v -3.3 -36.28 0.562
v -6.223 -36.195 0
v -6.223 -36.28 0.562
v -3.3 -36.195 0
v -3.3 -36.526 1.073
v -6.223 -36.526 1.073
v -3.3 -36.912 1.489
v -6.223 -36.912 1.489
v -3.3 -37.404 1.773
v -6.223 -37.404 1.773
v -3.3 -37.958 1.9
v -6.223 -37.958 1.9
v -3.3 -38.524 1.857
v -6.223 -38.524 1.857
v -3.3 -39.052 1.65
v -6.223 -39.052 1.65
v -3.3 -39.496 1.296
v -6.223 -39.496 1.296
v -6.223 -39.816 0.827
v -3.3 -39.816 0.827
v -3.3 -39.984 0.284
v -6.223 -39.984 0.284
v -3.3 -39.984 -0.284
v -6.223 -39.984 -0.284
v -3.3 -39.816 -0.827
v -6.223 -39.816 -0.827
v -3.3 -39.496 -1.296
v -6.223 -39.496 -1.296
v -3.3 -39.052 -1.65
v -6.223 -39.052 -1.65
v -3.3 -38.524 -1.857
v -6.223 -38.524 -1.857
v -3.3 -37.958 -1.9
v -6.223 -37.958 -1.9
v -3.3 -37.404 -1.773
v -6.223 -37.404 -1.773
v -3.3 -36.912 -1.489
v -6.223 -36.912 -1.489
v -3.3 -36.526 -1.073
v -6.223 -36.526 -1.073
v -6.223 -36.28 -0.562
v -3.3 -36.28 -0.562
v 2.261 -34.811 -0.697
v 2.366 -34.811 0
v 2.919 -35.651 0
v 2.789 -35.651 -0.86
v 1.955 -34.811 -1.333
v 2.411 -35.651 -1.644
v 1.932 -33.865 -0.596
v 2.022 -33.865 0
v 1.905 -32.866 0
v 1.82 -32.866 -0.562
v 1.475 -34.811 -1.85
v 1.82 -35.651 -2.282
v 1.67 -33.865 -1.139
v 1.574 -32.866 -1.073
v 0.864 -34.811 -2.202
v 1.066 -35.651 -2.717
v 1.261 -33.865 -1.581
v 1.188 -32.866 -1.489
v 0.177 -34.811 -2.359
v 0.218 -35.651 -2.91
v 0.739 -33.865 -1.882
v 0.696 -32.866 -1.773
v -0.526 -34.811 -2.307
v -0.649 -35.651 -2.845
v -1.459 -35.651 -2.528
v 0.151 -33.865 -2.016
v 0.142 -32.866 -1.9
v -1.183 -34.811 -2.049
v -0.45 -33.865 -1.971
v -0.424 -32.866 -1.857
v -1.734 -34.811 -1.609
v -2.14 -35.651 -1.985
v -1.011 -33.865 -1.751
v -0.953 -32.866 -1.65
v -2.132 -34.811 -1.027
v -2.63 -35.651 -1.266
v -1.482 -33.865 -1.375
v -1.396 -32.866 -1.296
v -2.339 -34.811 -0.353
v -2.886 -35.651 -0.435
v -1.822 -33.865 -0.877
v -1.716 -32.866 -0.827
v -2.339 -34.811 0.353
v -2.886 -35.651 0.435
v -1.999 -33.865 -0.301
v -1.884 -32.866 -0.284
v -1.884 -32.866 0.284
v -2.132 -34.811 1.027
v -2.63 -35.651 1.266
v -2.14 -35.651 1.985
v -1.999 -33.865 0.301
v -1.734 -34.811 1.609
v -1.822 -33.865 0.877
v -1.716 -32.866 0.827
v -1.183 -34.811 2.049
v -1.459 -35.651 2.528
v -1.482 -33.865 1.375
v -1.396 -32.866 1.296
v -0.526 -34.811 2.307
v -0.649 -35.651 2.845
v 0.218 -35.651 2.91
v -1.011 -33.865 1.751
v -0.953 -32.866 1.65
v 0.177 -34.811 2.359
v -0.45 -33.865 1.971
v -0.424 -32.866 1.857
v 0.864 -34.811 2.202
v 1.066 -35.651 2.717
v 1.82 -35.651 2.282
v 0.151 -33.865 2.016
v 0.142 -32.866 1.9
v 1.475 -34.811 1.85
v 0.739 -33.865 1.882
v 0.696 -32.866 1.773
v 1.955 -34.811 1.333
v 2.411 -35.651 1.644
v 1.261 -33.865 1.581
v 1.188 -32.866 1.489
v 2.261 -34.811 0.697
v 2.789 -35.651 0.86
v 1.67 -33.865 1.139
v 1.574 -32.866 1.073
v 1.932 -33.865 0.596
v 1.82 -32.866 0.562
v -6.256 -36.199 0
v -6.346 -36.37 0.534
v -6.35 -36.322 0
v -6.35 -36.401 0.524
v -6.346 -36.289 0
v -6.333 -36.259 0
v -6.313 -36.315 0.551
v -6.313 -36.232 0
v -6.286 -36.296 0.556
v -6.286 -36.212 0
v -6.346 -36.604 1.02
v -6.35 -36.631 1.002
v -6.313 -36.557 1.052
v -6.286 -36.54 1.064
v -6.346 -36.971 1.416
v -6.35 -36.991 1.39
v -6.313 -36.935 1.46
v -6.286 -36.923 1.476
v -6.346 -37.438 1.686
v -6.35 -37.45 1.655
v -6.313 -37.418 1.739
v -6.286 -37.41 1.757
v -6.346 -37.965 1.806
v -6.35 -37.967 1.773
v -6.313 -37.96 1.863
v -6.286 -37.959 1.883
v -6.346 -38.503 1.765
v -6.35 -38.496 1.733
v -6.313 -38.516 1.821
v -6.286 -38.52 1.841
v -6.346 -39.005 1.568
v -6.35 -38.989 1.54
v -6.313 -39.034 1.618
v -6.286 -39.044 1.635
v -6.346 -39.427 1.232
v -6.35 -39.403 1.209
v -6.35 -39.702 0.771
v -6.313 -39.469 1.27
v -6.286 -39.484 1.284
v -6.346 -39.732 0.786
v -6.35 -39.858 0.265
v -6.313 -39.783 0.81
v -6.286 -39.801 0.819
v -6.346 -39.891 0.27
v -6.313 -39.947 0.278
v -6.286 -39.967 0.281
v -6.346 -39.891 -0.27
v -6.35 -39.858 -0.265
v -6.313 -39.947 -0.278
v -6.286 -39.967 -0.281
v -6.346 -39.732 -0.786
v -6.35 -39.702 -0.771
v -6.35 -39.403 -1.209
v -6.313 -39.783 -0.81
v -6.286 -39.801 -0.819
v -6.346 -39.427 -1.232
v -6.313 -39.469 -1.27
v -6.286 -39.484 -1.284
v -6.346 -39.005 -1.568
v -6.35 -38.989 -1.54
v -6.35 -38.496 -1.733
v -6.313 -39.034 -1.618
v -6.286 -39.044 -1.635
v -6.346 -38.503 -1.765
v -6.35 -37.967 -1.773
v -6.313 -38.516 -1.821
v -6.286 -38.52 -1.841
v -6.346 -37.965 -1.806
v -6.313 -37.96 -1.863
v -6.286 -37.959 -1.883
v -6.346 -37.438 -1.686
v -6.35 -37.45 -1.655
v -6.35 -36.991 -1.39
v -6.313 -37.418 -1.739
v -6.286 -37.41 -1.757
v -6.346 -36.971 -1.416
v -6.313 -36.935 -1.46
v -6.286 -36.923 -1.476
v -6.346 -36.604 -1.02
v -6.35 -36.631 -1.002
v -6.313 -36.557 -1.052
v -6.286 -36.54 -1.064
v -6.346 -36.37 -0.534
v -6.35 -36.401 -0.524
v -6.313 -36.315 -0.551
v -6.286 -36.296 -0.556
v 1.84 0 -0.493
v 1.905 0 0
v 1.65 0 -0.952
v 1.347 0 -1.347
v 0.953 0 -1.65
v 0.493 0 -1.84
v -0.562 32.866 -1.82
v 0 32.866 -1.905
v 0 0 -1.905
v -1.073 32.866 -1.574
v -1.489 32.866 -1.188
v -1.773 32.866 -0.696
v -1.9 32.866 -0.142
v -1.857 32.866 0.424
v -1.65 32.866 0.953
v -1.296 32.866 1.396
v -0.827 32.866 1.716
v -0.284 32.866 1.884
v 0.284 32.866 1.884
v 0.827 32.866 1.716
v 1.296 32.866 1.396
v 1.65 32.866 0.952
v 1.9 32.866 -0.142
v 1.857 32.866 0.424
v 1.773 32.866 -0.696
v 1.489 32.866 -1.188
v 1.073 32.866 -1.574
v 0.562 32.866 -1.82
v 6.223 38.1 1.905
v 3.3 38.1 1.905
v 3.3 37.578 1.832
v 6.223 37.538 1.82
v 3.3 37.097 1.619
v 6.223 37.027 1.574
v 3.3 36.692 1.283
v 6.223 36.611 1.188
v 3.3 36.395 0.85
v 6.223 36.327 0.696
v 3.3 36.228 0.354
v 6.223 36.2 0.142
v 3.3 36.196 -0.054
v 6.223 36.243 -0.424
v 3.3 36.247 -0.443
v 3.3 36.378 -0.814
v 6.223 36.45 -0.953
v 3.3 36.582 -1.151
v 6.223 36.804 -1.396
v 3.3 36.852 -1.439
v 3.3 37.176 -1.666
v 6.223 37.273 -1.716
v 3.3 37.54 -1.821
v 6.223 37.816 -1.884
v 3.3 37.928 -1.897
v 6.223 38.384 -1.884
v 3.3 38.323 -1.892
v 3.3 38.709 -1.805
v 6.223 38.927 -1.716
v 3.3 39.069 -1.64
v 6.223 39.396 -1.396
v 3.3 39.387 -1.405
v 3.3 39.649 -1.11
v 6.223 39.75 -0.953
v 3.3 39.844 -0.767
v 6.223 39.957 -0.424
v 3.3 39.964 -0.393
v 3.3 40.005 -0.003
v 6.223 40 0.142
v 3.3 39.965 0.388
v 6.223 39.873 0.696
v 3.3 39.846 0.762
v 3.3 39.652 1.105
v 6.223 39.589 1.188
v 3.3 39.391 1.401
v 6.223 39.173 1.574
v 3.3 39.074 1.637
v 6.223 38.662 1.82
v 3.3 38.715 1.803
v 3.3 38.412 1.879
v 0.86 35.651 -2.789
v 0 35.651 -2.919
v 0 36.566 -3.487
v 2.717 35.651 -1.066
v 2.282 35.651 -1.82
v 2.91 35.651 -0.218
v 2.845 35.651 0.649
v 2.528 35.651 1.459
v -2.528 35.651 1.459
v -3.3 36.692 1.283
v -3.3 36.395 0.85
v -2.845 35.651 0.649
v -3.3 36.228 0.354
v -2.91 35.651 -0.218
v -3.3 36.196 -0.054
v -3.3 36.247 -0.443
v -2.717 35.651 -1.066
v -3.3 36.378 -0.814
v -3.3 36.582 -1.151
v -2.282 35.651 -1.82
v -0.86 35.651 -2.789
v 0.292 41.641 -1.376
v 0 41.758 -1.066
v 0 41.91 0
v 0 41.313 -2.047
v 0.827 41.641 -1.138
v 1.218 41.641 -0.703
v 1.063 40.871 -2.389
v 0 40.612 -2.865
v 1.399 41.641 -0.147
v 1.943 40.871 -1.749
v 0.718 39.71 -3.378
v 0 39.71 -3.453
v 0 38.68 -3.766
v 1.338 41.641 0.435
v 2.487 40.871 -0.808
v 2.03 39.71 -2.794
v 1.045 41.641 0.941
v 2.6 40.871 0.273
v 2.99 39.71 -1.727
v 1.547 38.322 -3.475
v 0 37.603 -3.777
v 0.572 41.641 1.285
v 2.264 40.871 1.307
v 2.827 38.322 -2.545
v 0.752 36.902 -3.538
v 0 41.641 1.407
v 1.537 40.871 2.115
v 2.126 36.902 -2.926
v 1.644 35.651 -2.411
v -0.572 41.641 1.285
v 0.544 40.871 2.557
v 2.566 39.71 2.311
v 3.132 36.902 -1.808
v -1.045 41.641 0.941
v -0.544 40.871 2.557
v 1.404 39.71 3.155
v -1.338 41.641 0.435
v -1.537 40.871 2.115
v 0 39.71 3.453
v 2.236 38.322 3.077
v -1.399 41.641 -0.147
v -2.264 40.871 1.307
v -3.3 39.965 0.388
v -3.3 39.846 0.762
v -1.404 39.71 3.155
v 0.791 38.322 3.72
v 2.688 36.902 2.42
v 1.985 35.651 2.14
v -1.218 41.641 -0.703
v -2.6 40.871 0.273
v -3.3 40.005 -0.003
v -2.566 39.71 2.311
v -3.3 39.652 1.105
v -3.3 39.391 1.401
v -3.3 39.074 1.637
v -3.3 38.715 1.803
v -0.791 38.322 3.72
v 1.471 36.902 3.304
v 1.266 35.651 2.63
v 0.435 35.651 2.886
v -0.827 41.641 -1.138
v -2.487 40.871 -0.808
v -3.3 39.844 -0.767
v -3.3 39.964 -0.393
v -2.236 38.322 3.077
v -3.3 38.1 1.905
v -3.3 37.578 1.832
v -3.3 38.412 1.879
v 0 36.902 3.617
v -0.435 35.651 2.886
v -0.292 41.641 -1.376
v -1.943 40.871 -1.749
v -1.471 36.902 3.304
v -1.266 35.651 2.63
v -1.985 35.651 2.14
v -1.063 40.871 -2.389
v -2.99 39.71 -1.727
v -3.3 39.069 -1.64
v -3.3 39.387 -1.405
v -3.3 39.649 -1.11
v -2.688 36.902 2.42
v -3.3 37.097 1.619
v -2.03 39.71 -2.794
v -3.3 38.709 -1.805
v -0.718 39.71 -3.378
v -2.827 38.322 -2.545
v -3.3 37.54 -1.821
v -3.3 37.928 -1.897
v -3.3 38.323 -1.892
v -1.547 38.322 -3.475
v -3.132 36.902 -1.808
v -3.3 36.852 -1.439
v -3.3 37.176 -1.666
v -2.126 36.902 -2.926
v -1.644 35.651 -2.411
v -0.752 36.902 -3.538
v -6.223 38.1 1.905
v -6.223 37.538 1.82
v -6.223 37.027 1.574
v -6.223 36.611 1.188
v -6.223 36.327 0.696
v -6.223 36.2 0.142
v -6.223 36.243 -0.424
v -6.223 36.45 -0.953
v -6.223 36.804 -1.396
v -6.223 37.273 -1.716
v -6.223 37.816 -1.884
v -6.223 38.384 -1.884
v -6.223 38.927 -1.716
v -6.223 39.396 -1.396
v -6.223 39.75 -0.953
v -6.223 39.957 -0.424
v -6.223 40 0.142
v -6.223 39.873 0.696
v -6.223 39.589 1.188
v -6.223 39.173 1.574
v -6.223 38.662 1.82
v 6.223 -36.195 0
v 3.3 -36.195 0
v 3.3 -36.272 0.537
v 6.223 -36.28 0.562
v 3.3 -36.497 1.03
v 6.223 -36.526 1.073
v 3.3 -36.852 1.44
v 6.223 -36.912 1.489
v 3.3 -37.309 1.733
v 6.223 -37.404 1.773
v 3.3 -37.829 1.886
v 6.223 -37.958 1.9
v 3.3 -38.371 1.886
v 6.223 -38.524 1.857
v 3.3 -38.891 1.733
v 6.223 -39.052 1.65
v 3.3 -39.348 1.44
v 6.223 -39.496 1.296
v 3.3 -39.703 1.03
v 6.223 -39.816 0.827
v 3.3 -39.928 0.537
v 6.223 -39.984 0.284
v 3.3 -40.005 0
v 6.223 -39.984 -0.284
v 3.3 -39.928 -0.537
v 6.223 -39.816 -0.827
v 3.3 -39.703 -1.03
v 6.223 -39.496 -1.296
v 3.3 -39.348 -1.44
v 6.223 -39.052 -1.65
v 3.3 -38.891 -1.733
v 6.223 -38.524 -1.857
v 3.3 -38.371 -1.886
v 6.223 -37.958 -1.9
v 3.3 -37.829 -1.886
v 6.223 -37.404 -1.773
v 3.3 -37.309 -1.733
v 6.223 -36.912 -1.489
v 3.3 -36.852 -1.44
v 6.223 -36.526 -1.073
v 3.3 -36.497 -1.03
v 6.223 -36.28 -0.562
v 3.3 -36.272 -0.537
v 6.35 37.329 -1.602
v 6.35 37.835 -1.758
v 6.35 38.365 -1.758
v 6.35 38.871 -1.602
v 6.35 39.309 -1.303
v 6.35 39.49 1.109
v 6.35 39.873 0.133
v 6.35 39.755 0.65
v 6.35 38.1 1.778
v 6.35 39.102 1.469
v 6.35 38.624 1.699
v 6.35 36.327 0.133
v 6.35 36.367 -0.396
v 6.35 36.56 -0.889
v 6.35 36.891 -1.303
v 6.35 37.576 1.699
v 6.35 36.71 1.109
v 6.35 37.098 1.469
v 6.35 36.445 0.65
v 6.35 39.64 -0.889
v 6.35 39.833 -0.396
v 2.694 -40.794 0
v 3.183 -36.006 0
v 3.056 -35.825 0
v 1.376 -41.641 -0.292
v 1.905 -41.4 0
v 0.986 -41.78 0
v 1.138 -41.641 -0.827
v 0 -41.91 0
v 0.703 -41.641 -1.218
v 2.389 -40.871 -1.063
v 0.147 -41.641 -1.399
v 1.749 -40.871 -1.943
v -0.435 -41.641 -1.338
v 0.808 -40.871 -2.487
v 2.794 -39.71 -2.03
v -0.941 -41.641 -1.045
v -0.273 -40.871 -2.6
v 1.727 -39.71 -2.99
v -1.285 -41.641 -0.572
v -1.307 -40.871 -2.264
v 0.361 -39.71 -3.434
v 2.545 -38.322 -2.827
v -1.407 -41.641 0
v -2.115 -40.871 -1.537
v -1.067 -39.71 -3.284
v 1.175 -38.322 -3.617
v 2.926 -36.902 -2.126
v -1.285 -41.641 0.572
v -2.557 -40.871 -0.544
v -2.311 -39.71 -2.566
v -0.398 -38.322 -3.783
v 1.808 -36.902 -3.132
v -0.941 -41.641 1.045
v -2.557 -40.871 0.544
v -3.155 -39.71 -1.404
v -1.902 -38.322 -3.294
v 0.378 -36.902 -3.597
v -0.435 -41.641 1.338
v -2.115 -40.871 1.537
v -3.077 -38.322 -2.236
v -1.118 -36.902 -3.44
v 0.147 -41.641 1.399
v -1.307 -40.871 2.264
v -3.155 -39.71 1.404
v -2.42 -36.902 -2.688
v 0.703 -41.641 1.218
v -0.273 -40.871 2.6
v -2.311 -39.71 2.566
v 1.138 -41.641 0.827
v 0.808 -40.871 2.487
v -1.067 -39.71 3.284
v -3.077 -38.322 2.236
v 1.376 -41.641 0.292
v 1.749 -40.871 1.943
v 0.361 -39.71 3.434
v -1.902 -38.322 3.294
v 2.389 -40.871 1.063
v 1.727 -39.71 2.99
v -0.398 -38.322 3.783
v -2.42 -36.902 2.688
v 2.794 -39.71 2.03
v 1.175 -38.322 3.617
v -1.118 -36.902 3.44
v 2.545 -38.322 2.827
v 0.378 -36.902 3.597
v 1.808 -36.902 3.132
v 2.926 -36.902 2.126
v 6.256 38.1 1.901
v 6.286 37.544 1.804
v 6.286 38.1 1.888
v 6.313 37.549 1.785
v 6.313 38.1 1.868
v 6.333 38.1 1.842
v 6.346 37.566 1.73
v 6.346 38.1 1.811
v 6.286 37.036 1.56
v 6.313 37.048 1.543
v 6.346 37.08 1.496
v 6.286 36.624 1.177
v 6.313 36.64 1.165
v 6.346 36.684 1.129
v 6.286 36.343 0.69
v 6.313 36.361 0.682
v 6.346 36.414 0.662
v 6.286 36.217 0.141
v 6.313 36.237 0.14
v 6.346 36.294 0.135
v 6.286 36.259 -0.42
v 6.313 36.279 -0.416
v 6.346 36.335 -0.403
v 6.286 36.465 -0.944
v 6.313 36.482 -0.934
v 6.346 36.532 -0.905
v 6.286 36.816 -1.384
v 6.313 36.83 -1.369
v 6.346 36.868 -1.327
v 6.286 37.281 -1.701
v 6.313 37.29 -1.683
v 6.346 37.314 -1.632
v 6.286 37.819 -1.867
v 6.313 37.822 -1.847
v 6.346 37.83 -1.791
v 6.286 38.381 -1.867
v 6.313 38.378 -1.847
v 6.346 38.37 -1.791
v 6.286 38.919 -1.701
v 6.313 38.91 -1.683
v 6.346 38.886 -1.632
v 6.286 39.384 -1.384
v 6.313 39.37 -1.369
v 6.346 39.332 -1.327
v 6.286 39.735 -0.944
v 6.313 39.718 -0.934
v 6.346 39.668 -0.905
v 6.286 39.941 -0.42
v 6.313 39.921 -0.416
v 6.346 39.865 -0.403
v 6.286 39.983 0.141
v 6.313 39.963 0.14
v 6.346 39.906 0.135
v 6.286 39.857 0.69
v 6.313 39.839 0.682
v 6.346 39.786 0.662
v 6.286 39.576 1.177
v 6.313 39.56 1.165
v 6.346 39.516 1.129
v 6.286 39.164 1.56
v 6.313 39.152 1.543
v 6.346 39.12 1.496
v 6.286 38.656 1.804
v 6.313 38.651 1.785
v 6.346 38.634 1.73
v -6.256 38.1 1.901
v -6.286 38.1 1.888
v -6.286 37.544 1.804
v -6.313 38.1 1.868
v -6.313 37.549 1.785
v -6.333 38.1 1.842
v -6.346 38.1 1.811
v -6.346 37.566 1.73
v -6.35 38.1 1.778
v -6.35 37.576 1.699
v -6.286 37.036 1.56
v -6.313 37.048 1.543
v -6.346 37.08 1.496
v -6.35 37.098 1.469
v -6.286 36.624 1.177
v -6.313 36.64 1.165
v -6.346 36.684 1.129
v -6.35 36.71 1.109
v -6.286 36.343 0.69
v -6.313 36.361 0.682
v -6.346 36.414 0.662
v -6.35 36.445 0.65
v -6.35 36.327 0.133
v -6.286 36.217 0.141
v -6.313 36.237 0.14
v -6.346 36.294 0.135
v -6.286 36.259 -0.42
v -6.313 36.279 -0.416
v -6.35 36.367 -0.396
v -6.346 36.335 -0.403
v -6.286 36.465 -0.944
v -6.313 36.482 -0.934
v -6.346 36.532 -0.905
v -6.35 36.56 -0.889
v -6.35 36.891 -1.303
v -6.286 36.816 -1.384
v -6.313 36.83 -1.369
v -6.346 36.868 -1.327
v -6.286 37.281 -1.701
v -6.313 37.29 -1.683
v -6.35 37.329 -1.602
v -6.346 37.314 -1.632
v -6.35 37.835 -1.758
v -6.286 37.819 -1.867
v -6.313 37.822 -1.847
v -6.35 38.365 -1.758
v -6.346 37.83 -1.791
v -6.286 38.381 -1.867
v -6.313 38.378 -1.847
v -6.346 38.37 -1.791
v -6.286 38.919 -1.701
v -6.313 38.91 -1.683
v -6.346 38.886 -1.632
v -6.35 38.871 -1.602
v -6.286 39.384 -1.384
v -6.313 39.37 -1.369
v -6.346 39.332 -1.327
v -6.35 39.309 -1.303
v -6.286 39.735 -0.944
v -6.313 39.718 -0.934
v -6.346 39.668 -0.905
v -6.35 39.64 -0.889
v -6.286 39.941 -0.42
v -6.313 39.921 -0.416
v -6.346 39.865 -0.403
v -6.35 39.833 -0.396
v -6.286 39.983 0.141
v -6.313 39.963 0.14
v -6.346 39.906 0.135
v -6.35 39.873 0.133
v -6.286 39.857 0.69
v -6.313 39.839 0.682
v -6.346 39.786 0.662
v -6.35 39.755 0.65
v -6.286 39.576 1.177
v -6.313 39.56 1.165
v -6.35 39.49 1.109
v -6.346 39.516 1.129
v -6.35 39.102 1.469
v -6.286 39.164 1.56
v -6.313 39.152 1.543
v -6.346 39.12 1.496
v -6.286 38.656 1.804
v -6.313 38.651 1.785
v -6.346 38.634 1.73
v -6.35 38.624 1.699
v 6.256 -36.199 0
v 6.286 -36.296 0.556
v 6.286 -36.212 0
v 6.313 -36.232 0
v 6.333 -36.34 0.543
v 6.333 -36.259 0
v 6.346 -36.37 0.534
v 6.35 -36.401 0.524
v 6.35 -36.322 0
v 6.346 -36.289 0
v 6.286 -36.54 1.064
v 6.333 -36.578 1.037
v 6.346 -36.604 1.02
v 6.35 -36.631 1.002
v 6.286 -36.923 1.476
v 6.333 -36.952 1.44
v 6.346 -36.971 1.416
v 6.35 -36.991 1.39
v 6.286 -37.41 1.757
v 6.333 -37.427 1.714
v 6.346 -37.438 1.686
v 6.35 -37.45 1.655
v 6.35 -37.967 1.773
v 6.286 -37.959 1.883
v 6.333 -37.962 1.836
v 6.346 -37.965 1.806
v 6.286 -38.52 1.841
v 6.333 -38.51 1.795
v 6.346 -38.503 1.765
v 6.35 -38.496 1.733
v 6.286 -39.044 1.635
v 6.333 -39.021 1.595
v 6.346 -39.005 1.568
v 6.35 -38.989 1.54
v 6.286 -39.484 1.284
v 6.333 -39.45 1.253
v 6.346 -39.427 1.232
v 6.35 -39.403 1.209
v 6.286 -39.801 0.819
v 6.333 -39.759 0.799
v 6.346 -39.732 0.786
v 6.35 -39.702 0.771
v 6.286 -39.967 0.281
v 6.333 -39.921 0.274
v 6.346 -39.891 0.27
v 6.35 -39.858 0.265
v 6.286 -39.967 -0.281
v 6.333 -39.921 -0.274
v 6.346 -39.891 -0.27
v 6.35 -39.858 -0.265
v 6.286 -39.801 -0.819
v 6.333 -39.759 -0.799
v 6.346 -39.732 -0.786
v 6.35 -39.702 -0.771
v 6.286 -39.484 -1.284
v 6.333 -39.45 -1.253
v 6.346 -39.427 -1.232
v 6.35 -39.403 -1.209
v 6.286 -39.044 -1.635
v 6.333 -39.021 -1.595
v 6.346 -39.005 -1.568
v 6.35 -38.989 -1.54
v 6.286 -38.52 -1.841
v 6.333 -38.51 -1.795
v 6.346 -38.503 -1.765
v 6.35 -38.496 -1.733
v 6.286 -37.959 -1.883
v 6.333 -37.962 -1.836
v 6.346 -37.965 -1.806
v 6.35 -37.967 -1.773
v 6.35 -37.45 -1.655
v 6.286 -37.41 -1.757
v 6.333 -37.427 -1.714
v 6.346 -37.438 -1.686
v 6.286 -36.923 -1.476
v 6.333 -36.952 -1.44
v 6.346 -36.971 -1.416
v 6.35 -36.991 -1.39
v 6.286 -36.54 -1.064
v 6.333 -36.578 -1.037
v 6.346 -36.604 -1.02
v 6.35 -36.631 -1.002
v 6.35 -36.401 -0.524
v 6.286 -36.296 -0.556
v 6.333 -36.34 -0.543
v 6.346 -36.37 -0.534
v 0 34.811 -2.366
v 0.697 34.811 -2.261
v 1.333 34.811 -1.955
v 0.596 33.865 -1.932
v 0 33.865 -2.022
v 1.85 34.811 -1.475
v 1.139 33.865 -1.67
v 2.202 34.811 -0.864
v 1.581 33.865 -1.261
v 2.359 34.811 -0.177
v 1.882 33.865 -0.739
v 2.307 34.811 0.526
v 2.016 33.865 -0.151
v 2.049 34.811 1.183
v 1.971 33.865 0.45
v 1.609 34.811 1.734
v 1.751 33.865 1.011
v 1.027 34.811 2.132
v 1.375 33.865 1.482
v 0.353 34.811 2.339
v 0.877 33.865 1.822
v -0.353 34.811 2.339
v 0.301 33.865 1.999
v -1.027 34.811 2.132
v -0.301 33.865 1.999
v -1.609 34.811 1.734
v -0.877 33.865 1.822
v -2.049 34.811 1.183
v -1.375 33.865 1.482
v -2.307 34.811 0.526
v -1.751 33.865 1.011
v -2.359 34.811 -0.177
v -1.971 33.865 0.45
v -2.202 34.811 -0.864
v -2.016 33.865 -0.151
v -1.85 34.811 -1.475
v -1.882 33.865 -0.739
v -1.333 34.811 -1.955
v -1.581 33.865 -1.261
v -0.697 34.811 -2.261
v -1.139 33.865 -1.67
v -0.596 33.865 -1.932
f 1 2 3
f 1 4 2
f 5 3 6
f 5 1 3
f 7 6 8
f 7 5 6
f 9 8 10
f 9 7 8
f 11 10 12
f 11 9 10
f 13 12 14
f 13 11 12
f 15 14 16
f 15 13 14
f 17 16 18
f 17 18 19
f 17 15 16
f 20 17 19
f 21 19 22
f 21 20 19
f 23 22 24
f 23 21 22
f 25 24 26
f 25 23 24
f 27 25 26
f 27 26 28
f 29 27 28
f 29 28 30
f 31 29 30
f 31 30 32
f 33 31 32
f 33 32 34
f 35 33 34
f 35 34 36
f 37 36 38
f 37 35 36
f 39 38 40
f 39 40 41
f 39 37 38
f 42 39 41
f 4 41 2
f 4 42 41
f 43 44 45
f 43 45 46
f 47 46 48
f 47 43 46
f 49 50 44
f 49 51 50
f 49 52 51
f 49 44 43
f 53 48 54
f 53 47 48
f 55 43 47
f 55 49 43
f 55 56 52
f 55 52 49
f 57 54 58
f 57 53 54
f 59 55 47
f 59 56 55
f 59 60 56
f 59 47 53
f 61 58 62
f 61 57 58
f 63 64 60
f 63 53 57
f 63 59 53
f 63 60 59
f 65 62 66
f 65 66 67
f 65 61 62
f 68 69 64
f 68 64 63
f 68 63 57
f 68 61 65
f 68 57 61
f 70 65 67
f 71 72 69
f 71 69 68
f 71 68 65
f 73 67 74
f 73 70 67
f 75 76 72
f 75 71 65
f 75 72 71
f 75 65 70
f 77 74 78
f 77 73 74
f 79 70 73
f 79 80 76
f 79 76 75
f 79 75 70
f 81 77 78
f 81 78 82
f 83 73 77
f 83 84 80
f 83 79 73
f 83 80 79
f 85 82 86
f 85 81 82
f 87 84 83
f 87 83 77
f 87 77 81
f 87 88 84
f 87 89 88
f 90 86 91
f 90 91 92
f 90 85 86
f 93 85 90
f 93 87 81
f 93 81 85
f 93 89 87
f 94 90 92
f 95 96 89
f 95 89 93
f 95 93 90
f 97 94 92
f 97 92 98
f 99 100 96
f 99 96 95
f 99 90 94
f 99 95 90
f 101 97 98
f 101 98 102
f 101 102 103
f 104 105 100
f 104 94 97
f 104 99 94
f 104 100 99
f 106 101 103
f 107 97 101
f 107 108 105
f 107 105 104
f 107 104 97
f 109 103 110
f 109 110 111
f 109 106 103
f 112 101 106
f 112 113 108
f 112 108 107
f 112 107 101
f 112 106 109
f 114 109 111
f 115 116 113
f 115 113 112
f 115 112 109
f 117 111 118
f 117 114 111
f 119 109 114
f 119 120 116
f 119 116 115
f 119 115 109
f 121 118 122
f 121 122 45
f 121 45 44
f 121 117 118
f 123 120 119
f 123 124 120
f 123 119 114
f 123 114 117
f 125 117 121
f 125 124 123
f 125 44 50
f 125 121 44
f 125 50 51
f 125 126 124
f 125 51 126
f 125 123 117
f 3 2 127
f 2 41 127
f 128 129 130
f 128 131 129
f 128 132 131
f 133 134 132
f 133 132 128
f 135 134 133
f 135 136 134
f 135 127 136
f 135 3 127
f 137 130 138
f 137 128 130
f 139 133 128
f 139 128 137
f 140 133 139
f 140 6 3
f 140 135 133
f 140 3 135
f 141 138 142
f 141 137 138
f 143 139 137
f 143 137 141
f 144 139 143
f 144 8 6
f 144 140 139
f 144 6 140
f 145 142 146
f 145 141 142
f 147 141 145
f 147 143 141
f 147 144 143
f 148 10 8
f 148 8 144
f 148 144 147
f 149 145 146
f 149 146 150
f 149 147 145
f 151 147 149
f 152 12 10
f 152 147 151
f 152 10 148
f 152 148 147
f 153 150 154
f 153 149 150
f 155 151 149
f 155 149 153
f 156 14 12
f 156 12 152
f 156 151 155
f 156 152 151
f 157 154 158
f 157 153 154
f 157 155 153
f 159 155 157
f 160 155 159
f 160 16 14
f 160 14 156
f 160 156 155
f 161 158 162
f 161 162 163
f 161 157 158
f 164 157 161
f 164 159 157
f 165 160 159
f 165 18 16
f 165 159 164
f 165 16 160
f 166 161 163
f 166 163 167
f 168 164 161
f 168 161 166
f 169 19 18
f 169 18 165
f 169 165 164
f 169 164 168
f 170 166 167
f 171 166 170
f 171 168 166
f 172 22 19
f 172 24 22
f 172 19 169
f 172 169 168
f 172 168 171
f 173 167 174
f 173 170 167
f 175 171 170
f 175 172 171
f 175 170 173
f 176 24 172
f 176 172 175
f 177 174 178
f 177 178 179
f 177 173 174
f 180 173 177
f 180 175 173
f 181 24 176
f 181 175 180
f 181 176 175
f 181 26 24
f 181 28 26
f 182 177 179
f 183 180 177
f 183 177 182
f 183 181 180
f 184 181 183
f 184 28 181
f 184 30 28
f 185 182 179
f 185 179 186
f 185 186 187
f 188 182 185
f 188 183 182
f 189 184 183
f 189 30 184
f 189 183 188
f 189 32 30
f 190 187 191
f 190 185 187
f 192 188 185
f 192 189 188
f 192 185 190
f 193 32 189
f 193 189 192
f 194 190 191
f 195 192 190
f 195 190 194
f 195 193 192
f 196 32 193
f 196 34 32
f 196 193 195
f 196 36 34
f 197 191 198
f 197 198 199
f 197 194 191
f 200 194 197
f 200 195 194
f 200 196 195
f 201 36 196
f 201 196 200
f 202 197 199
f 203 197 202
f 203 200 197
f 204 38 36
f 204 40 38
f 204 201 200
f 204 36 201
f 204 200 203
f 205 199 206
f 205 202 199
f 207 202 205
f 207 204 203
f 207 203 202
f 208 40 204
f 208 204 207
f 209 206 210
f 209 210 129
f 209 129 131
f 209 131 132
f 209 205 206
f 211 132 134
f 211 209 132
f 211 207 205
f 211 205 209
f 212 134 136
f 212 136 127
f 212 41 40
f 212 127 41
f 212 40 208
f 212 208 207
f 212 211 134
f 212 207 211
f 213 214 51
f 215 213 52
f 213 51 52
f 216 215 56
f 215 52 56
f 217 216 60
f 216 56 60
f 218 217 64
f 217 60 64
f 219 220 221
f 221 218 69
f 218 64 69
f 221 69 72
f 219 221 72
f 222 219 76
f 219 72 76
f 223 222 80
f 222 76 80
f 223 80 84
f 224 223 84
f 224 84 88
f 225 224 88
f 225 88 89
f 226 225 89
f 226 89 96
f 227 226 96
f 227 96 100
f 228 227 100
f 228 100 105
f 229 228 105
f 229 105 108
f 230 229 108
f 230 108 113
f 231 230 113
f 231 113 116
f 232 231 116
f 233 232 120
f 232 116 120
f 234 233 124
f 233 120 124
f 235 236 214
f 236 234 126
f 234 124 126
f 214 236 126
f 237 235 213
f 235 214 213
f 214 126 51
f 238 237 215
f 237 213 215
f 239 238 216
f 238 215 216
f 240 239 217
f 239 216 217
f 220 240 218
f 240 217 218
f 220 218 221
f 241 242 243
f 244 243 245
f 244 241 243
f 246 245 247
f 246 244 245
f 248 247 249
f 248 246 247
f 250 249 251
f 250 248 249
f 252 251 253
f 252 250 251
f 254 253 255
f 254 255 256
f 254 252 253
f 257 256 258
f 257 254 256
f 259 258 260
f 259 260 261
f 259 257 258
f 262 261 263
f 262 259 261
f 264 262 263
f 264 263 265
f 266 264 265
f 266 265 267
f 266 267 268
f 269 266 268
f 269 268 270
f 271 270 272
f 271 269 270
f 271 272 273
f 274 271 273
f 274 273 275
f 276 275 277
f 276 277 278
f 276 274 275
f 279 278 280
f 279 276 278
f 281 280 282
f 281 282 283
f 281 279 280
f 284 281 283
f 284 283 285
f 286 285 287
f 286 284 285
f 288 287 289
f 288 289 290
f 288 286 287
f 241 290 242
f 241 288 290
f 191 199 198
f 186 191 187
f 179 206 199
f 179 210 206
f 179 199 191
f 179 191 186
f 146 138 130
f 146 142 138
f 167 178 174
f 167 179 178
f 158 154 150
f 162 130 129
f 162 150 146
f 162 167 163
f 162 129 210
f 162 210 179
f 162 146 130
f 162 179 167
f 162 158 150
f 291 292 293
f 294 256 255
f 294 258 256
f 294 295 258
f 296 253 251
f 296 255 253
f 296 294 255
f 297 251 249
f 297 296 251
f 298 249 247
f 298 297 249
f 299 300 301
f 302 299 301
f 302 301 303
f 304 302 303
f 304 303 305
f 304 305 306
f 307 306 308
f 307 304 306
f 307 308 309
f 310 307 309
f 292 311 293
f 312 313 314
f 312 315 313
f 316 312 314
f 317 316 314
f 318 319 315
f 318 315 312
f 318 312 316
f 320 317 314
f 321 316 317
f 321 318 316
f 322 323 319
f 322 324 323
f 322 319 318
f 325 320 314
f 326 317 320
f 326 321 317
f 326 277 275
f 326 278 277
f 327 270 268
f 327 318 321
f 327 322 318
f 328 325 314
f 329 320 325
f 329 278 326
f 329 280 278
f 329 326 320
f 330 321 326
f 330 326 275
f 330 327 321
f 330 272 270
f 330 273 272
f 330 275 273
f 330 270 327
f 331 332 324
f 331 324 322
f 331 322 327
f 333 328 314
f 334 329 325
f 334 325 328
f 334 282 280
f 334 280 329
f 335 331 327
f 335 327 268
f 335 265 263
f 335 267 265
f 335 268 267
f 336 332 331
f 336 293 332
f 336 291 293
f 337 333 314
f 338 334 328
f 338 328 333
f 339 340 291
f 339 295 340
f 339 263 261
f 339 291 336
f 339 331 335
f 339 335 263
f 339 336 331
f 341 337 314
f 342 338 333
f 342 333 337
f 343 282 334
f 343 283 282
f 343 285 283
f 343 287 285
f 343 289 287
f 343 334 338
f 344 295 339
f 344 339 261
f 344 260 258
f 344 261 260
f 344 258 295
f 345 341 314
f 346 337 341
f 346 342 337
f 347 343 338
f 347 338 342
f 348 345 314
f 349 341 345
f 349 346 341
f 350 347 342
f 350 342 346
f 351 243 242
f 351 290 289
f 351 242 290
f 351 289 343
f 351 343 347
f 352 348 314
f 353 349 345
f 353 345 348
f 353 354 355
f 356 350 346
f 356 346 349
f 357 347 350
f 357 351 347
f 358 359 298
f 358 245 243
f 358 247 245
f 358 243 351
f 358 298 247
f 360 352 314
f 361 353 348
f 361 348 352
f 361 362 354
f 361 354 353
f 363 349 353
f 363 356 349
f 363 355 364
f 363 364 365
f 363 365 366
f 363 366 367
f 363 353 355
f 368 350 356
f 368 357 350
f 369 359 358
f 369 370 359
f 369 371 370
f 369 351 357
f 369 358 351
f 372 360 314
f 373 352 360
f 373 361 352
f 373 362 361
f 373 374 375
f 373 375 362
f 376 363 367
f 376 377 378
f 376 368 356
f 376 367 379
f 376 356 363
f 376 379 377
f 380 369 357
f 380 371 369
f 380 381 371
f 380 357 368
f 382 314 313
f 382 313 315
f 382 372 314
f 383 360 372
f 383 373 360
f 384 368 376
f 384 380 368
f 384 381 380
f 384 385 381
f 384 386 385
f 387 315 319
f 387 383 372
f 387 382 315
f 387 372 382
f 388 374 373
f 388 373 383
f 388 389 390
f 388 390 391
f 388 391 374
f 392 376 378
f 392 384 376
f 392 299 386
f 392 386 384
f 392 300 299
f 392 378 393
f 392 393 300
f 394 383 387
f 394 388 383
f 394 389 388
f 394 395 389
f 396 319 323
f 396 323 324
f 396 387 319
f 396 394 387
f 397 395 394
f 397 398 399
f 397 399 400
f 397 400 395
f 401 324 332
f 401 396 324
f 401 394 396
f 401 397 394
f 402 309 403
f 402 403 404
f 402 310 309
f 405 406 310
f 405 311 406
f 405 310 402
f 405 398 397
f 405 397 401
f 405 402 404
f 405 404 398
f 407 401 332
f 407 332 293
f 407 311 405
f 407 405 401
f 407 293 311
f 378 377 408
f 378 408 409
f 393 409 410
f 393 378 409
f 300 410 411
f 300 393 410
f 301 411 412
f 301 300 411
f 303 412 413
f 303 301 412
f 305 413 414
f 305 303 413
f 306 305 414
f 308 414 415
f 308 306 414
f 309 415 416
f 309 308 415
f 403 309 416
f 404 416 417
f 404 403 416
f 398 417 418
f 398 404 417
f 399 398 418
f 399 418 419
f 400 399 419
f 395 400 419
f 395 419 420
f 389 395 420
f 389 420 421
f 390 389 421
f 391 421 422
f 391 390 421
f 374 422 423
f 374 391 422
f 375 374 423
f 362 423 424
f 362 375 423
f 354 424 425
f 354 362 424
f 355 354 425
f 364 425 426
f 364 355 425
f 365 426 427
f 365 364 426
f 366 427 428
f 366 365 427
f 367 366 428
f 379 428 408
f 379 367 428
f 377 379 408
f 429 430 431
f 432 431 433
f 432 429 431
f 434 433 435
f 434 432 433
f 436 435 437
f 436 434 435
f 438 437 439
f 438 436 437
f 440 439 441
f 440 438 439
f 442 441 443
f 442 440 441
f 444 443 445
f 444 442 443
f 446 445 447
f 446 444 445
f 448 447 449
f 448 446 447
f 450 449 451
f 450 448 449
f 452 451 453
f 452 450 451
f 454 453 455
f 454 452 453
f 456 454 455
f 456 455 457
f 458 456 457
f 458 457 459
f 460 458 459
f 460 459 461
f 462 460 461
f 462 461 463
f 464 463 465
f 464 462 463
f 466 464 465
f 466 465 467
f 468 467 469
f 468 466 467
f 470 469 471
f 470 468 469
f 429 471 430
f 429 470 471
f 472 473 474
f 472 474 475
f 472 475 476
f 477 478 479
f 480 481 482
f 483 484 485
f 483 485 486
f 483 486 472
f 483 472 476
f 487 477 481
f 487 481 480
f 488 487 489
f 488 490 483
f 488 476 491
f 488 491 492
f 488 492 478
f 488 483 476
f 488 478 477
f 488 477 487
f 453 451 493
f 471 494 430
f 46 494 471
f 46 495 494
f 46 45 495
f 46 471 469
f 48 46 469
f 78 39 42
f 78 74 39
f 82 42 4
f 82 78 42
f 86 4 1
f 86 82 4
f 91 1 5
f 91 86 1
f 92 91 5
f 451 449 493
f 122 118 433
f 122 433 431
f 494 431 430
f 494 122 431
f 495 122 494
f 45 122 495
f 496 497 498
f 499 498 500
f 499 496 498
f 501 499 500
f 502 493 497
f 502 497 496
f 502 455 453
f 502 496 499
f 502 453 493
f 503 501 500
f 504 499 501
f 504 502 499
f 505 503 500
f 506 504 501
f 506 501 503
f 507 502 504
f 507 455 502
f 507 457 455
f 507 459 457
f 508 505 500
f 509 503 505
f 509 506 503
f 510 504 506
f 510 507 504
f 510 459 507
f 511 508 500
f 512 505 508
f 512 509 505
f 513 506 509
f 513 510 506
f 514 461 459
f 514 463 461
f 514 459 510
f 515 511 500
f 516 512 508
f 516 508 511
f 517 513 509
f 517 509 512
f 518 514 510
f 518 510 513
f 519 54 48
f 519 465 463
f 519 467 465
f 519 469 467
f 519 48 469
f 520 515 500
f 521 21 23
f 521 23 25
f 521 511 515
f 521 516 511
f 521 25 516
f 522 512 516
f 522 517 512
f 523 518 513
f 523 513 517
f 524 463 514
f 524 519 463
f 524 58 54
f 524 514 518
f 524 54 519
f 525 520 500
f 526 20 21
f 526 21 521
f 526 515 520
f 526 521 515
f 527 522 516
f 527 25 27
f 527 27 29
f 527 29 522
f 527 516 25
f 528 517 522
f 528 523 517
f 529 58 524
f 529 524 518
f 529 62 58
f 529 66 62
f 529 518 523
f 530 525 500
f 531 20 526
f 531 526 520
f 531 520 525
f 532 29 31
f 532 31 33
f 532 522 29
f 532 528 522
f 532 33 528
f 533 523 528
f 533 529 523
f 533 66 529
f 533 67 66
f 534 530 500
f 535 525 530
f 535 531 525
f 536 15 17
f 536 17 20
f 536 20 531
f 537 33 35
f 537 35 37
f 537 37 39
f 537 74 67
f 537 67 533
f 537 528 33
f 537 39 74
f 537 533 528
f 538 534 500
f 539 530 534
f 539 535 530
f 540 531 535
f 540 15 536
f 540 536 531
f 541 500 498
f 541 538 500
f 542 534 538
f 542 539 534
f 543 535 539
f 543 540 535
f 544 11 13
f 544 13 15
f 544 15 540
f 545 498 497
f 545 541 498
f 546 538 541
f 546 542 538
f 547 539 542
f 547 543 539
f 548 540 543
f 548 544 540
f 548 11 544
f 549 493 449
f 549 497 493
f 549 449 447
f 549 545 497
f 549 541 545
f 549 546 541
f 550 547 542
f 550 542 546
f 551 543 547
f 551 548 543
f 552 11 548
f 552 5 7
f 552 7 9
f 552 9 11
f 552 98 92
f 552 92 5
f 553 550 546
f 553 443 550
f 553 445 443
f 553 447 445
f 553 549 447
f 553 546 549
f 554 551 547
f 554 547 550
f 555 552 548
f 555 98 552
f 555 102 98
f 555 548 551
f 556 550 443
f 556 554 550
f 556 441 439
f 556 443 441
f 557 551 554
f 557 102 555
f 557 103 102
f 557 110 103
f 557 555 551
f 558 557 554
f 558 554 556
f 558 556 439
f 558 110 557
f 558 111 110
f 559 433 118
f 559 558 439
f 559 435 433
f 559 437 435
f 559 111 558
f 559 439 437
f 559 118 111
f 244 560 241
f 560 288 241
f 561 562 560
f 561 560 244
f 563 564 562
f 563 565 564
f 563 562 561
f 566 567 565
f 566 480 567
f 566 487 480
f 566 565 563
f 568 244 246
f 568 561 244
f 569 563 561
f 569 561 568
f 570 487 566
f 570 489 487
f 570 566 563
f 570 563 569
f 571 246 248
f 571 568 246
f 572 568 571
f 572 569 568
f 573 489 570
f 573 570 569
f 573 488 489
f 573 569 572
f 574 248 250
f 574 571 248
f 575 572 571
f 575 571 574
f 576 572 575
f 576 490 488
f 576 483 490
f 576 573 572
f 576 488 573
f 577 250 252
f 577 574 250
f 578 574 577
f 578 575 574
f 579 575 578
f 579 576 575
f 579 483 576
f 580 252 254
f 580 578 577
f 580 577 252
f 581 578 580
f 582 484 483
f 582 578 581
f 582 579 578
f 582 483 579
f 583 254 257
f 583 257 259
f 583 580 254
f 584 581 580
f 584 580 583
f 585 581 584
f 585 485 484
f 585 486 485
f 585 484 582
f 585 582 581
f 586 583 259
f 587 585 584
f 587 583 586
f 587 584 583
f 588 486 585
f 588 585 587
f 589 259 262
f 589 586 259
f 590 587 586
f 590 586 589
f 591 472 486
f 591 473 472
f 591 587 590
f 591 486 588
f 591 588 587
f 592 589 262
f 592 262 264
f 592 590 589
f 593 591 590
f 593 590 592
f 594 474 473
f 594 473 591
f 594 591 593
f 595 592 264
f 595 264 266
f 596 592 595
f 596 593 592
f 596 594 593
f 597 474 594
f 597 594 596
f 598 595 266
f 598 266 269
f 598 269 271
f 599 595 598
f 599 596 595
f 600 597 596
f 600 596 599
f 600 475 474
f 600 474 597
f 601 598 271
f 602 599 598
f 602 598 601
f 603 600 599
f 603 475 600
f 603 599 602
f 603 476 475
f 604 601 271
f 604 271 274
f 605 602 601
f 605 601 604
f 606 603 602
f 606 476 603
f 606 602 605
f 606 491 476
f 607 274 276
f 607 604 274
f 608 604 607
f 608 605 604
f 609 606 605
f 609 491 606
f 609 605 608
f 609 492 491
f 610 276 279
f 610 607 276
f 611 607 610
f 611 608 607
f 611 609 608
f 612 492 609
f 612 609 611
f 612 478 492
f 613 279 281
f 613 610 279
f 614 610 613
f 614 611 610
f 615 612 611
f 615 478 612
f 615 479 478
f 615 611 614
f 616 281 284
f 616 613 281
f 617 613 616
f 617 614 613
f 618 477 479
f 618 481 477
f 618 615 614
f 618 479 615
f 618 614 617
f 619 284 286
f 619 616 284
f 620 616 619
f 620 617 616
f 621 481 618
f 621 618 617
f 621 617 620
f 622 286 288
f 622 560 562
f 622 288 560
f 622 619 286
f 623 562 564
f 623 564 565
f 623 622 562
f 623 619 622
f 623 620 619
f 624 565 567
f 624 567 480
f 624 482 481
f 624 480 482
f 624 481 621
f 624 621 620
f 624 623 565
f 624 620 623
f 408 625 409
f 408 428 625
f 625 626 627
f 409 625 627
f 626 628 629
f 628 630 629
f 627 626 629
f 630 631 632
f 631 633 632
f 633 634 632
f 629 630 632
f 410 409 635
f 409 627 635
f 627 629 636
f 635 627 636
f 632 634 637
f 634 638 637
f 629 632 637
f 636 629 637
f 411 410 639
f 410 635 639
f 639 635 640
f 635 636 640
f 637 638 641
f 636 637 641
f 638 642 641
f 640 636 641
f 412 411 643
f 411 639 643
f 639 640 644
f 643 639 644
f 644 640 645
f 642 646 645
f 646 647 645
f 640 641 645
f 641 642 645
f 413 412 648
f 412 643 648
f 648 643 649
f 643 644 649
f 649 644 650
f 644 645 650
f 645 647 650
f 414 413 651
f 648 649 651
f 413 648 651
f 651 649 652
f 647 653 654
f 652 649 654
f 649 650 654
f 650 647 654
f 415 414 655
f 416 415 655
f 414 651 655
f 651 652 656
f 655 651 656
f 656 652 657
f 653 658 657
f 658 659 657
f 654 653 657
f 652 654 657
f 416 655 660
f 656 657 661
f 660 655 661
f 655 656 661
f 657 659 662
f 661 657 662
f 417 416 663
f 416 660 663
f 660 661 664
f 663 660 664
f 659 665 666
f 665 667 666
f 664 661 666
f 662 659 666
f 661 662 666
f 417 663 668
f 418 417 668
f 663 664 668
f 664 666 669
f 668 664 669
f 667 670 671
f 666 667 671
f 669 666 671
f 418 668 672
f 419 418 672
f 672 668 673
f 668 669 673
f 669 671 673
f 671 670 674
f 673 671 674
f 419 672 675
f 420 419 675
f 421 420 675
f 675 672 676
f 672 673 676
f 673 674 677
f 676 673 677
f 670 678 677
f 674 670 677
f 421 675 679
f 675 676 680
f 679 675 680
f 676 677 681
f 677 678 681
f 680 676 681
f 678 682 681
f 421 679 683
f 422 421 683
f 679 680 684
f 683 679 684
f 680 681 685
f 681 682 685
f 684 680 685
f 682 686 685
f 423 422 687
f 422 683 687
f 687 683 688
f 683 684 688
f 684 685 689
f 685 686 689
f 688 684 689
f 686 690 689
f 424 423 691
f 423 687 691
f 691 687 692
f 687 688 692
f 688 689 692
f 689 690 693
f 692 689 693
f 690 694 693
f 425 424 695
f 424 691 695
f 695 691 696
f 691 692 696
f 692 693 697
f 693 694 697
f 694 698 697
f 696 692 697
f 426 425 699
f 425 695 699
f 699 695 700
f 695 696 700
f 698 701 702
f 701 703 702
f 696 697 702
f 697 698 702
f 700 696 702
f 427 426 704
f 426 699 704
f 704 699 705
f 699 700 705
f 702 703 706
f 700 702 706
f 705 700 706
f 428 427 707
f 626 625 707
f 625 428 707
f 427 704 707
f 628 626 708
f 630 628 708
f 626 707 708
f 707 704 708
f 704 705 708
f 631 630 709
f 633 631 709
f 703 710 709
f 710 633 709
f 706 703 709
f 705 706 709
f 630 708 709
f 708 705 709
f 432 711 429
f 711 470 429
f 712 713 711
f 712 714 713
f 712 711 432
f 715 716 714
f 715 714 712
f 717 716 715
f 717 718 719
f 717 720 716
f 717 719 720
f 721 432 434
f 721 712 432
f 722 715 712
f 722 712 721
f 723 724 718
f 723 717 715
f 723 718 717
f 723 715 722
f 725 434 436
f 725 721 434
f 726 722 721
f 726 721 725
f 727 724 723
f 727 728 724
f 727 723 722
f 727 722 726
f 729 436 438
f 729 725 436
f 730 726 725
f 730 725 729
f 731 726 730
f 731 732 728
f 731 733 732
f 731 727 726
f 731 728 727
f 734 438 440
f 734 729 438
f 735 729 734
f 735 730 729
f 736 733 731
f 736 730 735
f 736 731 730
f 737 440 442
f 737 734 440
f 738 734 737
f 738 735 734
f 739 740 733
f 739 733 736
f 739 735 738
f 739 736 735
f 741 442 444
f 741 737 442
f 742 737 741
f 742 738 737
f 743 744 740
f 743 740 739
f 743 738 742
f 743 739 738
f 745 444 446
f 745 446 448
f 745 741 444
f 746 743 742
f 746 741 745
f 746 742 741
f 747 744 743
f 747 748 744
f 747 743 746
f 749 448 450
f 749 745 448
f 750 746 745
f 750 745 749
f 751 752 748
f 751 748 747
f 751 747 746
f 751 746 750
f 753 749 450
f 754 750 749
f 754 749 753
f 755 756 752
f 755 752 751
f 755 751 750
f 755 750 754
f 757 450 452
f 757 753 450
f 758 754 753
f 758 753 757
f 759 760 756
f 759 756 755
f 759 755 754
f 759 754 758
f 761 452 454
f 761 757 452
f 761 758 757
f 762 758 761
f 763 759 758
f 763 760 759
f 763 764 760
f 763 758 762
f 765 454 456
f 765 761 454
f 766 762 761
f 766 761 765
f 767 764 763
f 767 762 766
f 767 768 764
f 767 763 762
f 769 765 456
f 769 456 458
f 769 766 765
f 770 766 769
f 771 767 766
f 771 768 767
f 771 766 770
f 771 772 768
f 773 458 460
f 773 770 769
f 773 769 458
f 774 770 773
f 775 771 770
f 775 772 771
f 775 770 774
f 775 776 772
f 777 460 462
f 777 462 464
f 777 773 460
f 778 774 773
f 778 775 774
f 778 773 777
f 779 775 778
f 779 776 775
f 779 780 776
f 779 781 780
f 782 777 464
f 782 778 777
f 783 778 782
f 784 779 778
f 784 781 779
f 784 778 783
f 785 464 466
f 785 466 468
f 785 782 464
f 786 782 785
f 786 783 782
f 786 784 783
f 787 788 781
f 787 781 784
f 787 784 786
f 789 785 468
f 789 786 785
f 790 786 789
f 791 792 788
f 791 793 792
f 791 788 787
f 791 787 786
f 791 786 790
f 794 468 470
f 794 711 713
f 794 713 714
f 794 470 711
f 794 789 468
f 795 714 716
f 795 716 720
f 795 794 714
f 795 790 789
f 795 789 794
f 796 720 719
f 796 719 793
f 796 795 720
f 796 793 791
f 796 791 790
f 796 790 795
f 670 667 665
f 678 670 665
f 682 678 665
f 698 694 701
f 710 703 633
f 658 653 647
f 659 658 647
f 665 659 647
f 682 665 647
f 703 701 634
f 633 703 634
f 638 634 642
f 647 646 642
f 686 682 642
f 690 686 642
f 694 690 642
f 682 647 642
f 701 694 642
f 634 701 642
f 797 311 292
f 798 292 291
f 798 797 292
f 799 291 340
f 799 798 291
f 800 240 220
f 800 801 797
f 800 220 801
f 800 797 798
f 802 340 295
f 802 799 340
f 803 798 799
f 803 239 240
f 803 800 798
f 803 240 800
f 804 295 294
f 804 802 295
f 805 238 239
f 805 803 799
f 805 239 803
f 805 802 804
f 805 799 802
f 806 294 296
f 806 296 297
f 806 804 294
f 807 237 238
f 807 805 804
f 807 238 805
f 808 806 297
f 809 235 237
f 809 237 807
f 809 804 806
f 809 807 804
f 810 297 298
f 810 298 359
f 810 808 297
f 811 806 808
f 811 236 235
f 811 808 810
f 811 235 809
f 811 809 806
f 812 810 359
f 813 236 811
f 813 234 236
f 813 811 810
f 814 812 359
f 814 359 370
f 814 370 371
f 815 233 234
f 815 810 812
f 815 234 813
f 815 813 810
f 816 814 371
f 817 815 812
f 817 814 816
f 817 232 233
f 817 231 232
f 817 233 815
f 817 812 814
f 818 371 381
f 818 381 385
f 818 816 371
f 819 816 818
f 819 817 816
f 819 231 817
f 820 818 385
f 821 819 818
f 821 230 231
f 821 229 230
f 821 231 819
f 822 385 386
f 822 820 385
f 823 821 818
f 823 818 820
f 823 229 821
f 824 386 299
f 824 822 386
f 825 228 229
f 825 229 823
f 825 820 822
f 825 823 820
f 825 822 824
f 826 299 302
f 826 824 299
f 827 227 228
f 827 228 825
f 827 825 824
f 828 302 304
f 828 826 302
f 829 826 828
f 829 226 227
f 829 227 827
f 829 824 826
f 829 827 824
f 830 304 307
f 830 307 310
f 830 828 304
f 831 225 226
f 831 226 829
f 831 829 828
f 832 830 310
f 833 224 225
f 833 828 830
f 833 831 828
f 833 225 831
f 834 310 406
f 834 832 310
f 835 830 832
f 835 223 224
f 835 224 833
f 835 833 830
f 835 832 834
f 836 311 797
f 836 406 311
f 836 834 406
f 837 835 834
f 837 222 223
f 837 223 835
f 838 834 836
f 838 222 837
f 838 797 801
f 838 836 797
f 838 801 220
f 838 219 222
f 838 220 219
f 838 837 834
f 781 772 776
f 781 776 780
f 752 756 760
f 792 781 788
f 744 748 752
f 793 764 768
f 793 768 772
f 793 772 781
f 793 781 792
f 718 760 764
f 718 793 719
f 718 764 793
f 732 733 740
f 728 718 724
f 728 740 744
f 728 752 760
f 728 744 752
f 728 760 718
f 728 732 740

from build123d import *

# Parameters (mm, degrees)
SKETCH1_R           = 1.905
BOSS_EXTRUDE1_DEPTH = 38.1
SKETCH3_R           = 1.905
BOSS_EXTRUDE2_DEPTH = 6.35
FILLET1_R           = 0.127
MIRROR1_START       = -32.866055516
MIRROR1_2_OUTLINE_R = 1.905
MIRROR1_2_DEPTH     = 32.866055516


with BuildPart() as part:
    # Sketch1 → Boss-Extrude1 (new body)
    with BuildSketch(Plane(origin=(0, 0, 0), x_dir=(1, 0, 0), z_dir=(0, 1, 0))):
        with Locations(Location((0, 0, 0), (0, 0, 90))):
            Circle(SKETCH1_R)
    extrude(amount=BOSS_EXTRUDE1_DEPTH)

    # Sketch2 → Revolve2 (revolve)
    with BuildSketch(Plane.XY, mode=Mode.PRIVATE) as revolve2_sk:
        with BuildLine():
            Line((1.905, 32.866055516), (0, 32.866055516))
            Line((0, 32.866055516), (0, 41.91))
            ThreePointArc((0, 41.91), (3.453032669, 39.710175577), (2.918629328, 35.650979207))
            ThreePointArc((2.918629328, 35.650979207), (2.166286071, 34.347882461), (1.905, 32.866055516))
        make_face()
    revolve(revolve2_sk.sketch.rotate(Axis((0, 41.91, 0), (0, -1, 0)), 270), axis=Axis((0, 41.91, 0), (0, -1, 0)))

    # Sketch3 → Boss-Extrude2 (add, symmetric)
    with BuildSketch(Plane(origin=(0, 0, 0), x_dir=(0, 0, -1), z_dir=(1, 0, 0))):
        with Locations(Location((0, 38.1, 0), (0, 0, 180))):
            Circle(SKETCH3_R)
    extrude(amount=BOSS_EXTRUDE2_DEPTH, both=True)

    # Fillet1
    fillet1_edges = [part.edges().sort_by_distance(p)[0] for p in [
        (-6.35, 38.1, -1.905),
        (6.35, 38.1, -1.905),
    ]]
    fillet(fillet1_edges, radius=FILLET1_R)



with BuildPart() as body_2:
    # Mirror1: read off the stored shape, not the designer's step
    # Mirror1 outline → Mirror1 (revolve)
    with BuildSketch(Plane.XY):
        with BuildLine():
            Line((0, -32.866055516), (0, -41.91))
            ThreePointArc((0, -41.91), (3.453032669, -39.710175576), (2.918629327, -35.650979205))
            ThreePointArc((2.918629327, -35.650979205), (2.166286071, -34.347882461), (1.905, -32.866055516))
            Line((1.905, -32.866055516), (0, -32.866055516))
        make_face()
    revolve(axis=Axis((0, 0, 0), (0, 1, 0)))


with BuildPart() as part_1:
    add(part.part)

    add(body_2.part)  # Mirror1 2 merges body 2
    # Mirror1 2 outline → Mirror1 2 (add)
    with BuildSketch(Plane(origin=(0, 0, 0), x_dir=(1, 0, 0), z_dir=(0, 1, 0)).offset(MIRROR1_START)):
        Circle(MIRROR1_2_OUTLINE_R)
    extrude(amount=MIRROR1_2_DEPTH)

    # Mirror1 3 outline → Mirror1 3 (revolve)
    with BuildSketch(Plane(origin=(0, -38.1, 0), x_dir=(0, 1, 0), z_dir=(0, 0, -1))):
        with BuildLine():
            Line((1.778, 6.35), (0, 6.35))
            Line((0, 6.35), (0, 3.299556788))
            Line((0, 3.299556788), (1.905, 3.299556788))
            Line((1.905, 3.299556788), (1.905, 6.223))
            ThreePointArc((1.905, 6.223), (1.867802561, 6.312802561), (1.778, 6.35))
        make_face()
        with BuildLine():
            Line((1.905, -3.299556788), (0, -3.299556788))
            Line((0, -3.299556788), (0, -6.35))
            Line((0, -6.35), (1.778, -6.35))
            ThreePointArc((1.778, -6.35), (1.867802561, -6.312802561), (1.905, -6.223))
            Line((1.905, -6.223), (1.905, -3.299556788))
        make_face()
    revolve(axis=Axis((0, -38.1, 0), (1, 0, 0)))


solid = part_1.part
